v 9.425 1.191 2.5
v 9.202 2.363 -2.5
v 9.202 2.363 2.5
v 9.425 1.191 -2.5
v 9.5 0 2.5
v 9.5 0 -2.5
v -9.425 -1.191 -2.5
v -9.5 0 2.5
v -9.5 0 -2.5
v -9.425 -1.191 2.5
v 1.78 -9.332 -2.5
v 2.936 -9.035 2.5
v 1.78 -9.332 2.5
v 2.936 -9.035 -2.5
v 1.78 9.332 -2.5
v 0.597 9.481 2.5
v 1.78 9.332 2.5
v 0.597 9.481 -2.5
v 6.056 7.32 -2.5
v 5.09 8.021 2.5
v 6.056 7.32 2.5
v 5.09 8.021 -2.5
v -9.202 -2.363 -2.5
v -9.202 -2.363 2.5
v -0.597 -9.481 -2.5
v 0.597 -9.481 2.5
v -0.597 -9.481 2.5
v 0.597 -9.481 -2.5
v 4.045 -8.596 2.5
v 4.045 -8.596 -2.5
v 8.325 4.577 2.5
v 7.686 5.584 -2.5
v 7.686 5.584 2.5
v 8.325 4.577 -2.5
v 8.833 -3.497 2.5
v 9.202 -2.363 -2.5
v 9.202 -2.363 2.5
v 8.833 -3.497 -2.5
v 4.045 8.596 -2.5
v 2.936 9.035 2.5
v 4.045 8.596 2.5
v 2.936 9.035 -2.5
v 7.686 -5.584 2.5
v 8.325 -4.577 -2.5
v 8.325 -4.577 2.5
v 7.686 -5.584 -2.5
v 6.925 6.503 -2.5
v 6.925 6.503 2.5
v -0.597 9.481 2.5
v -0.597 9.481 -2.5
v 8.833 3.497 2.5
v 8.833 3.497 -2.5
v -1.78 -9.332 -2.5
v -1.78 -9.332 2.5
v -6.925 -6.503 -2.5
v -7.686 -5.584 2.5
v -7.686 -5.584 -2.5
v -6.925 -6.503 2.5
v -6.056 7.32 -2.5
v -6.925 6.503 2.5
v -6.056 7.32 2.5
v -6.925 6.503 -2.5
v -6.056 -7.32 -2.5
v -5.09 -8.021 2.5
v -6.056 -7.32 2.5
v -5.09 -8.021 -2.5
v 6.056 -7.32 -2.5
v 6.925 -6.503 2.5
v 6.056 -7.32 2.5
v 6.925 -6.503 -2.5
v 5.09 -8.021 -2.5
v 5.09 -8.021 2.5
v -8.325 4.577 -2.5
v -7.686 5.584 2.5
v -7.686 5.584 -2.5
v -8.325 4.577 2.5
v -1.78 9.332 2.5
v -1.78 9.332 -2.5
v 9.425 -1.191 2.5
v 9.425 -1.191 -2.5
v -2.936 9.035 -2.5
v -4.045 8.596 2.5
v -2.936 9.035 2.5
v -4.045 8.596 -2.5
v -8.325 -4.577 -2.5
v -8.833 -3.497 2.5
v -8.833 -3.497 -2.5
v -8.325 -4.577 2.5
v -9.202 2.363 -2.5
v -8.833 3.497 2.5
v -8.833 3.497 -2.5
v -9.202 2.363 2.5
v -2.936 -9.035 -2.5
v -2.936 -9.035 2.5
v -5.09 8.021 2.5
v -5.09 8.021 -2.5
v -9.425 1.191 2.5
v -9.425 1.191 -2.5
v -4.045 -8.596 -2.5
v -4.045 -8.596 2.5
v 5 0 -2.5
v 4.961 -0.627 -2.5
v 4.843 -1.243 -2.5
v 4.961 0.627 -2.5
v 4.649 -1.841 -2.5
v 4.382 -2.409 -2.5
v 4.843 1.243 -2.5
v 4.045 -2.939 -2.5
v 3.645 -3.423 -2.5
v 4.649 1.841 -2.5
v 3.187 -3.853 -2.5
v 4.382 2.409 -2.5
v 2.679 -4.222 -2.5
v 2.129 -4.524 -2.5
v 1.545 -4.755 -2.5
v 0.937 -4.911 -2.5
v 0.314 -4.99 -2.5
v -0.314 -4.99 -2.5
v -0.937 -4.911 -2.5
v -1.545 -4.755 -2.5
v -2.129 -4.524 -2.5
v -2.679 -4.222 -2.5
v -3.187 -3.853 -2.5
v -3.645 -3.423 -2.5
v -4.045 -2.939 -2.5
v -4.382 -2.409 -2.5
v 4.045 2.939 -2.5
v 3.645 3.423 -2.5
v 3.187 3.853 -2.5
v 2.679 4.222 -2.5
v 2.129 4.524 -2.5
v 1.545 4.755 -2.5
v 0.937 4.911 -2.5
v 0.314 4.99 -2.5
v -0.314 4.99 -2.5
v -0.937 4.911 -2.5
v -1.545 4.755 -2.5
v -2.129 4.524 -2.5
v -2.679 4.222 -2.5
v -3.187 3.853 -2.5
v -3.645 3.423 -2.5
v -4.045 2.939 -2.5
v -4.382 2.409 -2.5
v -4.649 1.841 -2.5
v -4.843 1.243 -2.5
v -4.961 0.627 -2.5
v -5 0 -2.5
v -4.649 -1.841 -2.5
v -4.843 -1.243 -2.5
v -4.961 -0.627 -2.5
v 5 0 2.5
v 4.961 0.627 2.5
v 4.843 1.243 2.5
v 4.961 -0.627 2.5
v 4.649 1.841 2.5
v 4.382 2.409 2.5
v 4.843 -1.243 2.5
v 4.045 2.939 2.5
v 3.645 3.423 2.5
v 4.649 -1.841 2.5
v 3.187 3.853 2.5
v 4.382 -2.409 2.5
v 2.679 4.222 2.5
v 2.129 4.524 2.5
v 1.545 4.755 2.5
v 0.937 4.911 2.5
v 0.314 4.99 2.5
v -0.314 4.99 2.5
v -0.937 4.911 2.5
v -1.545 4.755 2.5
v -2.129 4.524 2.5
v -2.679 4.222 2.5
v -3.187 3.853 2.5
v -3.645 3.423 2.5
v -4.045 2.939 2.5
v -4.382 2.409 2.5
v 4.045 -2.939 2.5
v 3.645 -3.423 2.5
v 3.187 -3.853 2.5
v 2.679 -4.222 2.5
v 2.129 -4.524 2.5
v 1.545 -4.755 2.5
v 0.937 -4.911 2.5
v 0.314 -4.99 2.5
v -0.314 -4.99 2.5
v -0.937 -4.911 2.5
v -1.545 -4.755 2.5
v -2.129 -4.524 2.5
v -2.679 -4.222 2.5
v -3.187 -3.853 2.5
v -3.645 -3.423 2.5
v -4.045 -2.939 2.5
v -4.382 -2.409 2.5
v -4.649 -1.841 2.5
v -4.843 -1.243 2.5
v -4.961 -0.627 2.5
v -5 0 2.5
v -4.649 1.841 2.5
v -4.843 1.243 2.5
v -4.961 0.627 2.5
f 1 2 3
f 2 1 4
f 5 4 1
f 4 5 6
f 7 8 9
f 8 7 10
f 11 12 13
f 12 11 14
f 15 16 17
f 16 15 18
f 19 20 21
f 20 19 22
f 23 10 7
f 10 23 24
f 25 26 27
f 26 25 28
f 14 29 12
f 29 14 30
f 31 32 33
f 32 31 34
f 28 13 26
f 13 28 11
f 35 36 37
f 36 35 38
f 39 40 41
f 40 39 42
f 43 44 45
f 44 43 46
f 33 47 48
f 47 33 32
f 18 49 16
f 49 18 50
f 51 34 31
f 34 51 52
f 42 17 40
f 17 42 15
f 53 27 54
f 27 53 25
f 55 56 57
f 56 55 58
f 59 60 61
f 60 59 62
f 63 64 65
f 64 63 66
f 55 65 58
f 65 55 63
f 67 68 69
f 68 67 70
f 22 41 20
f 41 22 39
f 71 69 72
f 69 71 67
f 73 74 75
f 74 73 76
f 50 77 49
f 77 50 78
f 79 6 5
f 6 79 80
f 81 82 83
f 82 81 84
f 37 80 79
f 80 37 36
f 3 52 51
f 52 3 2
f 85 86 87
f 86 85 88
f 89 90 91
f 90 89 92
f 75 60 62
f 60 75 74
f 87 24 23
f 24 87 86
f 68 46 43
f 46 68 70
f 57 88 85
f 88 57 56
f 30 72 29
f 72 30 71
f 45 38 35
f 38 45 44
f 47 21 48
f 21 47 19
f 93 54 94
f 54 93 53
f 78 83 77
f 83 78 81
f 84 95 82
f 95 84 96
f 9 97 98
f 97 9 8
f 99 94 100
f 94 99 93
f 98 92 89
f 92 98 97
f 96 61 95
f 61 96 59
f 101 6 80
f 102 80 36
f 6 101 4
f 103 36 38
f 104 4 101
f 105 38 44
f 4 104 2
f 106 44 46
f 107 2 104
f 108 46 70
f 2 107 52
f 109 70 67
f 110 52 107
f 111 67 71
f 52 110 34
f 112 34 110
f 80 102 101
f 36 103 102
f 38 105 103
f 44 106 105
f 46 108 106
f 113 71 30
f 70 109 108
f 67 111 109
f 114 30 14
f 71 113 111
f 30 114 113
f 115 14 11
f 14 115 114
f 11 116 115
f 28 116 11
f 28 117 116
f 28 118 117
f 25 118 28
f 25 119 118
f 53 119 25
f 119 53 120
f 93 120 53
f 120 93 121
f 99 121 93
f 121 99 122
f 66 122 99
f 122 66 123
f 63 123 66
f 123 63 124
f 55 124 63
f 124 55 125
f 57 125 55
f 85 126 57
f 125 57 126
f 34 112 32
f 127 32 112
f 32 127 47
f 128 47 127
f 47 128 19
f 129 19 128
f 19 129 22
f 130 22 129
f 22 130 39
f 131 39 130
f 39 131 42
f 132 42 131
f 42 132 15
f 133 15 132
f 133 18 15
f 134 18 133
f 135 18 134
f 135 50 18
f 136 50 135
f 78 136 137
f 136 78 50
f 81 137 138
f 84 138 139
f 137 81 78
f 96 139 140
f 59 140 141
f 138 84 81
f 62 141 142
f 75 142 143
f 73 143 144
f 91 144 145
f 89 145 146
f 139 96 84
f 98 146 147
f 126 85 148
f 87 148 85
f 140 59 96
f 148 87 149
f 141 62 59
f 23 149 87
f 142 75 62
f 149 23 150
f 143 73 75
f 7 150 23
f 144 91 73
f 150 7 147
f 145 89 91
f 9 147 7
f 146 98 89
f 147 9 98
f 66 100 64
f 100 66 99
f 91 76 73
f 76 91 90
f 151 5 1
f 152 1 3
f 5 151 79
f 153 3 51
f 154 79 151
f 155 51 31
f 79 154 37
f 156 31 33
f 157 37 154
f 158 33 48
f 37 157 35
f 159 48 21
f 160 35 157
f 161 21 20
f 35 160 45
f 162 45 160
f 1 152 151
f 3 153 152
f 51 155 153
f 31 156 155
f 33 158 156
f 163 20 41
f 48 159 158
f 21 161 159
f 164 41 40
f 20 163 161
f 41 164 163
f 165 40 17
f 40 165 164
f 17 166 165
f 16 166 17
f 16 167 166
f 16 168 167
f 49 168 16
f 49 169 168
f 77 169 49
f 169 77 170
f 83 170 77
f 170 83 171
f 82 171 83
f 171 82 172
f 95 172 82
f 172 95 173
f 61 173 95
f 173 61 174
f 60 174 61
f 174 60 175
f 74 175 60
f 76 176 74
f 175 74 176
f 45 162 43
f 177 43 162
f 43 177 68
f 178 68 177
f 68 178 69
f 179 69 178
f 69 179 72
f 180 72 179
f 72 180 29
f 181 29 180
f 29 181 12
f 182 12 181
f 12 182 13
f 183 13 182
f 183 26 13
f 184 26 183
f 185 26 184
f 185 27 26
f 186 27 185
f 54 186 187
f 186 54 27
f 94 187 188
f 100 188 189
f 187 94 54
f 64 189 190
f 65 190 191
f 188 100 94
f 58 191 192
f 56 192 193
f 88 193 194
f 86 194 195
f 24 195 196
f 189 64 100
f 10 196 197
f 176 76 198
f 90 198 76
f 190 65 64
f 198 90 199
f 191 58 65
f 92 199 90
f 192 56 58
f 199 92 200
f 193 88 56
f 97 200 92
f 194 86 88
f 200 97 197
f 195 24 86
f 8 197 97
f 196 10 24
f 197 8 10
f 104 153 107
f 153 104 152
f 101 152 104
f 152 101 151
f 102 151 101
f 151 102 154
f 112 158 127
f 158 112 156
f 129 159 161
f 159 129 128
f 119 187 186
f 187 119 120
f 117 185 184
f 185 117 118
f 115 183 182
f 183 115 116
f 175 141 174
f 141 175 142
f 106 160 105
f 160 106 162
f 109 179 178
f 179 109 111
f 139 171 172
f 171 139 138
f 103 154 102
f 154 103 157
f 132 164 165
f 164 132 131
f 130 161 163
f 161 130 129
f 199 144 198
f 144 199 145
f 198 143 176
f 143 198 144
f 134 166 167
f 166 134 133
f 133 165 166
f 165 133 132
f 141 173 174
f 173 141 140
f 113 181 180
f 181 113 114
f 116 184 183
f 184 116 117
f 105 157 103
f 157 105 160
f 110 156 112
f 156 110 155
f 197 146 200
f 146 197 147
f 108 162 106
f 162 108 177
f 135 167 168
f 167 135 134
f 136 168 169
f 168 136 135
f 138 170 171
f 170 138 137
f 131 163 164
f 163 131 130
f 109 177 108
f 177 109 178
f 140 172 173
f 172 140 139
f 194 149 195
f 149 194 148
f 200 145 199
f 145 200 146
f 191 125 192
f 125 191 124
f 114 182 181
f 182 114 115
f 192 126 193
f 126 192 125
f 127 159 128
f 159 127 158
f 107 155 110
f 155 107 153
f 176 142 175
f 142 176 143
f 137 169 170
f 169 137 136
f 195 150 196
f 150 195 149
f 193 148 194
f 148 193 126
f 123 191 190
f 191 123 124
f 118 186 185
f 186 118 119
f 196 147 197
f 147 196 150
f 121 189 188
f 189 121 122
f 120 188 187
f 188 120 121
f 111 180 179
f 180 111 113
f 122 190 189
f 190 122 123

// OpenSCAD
$fn = 50;


difference() {
	union() {
		translate(v = [0, 0, -2.5000000000]) {
			cylinder(h = 5, r = 9.5000000000);
		}
	}
	union() {
		translate(v = [0, 0, -100.0000000000]) {
			cylinder(h = 200, r = 5.0000000000);
		}
	}
}
